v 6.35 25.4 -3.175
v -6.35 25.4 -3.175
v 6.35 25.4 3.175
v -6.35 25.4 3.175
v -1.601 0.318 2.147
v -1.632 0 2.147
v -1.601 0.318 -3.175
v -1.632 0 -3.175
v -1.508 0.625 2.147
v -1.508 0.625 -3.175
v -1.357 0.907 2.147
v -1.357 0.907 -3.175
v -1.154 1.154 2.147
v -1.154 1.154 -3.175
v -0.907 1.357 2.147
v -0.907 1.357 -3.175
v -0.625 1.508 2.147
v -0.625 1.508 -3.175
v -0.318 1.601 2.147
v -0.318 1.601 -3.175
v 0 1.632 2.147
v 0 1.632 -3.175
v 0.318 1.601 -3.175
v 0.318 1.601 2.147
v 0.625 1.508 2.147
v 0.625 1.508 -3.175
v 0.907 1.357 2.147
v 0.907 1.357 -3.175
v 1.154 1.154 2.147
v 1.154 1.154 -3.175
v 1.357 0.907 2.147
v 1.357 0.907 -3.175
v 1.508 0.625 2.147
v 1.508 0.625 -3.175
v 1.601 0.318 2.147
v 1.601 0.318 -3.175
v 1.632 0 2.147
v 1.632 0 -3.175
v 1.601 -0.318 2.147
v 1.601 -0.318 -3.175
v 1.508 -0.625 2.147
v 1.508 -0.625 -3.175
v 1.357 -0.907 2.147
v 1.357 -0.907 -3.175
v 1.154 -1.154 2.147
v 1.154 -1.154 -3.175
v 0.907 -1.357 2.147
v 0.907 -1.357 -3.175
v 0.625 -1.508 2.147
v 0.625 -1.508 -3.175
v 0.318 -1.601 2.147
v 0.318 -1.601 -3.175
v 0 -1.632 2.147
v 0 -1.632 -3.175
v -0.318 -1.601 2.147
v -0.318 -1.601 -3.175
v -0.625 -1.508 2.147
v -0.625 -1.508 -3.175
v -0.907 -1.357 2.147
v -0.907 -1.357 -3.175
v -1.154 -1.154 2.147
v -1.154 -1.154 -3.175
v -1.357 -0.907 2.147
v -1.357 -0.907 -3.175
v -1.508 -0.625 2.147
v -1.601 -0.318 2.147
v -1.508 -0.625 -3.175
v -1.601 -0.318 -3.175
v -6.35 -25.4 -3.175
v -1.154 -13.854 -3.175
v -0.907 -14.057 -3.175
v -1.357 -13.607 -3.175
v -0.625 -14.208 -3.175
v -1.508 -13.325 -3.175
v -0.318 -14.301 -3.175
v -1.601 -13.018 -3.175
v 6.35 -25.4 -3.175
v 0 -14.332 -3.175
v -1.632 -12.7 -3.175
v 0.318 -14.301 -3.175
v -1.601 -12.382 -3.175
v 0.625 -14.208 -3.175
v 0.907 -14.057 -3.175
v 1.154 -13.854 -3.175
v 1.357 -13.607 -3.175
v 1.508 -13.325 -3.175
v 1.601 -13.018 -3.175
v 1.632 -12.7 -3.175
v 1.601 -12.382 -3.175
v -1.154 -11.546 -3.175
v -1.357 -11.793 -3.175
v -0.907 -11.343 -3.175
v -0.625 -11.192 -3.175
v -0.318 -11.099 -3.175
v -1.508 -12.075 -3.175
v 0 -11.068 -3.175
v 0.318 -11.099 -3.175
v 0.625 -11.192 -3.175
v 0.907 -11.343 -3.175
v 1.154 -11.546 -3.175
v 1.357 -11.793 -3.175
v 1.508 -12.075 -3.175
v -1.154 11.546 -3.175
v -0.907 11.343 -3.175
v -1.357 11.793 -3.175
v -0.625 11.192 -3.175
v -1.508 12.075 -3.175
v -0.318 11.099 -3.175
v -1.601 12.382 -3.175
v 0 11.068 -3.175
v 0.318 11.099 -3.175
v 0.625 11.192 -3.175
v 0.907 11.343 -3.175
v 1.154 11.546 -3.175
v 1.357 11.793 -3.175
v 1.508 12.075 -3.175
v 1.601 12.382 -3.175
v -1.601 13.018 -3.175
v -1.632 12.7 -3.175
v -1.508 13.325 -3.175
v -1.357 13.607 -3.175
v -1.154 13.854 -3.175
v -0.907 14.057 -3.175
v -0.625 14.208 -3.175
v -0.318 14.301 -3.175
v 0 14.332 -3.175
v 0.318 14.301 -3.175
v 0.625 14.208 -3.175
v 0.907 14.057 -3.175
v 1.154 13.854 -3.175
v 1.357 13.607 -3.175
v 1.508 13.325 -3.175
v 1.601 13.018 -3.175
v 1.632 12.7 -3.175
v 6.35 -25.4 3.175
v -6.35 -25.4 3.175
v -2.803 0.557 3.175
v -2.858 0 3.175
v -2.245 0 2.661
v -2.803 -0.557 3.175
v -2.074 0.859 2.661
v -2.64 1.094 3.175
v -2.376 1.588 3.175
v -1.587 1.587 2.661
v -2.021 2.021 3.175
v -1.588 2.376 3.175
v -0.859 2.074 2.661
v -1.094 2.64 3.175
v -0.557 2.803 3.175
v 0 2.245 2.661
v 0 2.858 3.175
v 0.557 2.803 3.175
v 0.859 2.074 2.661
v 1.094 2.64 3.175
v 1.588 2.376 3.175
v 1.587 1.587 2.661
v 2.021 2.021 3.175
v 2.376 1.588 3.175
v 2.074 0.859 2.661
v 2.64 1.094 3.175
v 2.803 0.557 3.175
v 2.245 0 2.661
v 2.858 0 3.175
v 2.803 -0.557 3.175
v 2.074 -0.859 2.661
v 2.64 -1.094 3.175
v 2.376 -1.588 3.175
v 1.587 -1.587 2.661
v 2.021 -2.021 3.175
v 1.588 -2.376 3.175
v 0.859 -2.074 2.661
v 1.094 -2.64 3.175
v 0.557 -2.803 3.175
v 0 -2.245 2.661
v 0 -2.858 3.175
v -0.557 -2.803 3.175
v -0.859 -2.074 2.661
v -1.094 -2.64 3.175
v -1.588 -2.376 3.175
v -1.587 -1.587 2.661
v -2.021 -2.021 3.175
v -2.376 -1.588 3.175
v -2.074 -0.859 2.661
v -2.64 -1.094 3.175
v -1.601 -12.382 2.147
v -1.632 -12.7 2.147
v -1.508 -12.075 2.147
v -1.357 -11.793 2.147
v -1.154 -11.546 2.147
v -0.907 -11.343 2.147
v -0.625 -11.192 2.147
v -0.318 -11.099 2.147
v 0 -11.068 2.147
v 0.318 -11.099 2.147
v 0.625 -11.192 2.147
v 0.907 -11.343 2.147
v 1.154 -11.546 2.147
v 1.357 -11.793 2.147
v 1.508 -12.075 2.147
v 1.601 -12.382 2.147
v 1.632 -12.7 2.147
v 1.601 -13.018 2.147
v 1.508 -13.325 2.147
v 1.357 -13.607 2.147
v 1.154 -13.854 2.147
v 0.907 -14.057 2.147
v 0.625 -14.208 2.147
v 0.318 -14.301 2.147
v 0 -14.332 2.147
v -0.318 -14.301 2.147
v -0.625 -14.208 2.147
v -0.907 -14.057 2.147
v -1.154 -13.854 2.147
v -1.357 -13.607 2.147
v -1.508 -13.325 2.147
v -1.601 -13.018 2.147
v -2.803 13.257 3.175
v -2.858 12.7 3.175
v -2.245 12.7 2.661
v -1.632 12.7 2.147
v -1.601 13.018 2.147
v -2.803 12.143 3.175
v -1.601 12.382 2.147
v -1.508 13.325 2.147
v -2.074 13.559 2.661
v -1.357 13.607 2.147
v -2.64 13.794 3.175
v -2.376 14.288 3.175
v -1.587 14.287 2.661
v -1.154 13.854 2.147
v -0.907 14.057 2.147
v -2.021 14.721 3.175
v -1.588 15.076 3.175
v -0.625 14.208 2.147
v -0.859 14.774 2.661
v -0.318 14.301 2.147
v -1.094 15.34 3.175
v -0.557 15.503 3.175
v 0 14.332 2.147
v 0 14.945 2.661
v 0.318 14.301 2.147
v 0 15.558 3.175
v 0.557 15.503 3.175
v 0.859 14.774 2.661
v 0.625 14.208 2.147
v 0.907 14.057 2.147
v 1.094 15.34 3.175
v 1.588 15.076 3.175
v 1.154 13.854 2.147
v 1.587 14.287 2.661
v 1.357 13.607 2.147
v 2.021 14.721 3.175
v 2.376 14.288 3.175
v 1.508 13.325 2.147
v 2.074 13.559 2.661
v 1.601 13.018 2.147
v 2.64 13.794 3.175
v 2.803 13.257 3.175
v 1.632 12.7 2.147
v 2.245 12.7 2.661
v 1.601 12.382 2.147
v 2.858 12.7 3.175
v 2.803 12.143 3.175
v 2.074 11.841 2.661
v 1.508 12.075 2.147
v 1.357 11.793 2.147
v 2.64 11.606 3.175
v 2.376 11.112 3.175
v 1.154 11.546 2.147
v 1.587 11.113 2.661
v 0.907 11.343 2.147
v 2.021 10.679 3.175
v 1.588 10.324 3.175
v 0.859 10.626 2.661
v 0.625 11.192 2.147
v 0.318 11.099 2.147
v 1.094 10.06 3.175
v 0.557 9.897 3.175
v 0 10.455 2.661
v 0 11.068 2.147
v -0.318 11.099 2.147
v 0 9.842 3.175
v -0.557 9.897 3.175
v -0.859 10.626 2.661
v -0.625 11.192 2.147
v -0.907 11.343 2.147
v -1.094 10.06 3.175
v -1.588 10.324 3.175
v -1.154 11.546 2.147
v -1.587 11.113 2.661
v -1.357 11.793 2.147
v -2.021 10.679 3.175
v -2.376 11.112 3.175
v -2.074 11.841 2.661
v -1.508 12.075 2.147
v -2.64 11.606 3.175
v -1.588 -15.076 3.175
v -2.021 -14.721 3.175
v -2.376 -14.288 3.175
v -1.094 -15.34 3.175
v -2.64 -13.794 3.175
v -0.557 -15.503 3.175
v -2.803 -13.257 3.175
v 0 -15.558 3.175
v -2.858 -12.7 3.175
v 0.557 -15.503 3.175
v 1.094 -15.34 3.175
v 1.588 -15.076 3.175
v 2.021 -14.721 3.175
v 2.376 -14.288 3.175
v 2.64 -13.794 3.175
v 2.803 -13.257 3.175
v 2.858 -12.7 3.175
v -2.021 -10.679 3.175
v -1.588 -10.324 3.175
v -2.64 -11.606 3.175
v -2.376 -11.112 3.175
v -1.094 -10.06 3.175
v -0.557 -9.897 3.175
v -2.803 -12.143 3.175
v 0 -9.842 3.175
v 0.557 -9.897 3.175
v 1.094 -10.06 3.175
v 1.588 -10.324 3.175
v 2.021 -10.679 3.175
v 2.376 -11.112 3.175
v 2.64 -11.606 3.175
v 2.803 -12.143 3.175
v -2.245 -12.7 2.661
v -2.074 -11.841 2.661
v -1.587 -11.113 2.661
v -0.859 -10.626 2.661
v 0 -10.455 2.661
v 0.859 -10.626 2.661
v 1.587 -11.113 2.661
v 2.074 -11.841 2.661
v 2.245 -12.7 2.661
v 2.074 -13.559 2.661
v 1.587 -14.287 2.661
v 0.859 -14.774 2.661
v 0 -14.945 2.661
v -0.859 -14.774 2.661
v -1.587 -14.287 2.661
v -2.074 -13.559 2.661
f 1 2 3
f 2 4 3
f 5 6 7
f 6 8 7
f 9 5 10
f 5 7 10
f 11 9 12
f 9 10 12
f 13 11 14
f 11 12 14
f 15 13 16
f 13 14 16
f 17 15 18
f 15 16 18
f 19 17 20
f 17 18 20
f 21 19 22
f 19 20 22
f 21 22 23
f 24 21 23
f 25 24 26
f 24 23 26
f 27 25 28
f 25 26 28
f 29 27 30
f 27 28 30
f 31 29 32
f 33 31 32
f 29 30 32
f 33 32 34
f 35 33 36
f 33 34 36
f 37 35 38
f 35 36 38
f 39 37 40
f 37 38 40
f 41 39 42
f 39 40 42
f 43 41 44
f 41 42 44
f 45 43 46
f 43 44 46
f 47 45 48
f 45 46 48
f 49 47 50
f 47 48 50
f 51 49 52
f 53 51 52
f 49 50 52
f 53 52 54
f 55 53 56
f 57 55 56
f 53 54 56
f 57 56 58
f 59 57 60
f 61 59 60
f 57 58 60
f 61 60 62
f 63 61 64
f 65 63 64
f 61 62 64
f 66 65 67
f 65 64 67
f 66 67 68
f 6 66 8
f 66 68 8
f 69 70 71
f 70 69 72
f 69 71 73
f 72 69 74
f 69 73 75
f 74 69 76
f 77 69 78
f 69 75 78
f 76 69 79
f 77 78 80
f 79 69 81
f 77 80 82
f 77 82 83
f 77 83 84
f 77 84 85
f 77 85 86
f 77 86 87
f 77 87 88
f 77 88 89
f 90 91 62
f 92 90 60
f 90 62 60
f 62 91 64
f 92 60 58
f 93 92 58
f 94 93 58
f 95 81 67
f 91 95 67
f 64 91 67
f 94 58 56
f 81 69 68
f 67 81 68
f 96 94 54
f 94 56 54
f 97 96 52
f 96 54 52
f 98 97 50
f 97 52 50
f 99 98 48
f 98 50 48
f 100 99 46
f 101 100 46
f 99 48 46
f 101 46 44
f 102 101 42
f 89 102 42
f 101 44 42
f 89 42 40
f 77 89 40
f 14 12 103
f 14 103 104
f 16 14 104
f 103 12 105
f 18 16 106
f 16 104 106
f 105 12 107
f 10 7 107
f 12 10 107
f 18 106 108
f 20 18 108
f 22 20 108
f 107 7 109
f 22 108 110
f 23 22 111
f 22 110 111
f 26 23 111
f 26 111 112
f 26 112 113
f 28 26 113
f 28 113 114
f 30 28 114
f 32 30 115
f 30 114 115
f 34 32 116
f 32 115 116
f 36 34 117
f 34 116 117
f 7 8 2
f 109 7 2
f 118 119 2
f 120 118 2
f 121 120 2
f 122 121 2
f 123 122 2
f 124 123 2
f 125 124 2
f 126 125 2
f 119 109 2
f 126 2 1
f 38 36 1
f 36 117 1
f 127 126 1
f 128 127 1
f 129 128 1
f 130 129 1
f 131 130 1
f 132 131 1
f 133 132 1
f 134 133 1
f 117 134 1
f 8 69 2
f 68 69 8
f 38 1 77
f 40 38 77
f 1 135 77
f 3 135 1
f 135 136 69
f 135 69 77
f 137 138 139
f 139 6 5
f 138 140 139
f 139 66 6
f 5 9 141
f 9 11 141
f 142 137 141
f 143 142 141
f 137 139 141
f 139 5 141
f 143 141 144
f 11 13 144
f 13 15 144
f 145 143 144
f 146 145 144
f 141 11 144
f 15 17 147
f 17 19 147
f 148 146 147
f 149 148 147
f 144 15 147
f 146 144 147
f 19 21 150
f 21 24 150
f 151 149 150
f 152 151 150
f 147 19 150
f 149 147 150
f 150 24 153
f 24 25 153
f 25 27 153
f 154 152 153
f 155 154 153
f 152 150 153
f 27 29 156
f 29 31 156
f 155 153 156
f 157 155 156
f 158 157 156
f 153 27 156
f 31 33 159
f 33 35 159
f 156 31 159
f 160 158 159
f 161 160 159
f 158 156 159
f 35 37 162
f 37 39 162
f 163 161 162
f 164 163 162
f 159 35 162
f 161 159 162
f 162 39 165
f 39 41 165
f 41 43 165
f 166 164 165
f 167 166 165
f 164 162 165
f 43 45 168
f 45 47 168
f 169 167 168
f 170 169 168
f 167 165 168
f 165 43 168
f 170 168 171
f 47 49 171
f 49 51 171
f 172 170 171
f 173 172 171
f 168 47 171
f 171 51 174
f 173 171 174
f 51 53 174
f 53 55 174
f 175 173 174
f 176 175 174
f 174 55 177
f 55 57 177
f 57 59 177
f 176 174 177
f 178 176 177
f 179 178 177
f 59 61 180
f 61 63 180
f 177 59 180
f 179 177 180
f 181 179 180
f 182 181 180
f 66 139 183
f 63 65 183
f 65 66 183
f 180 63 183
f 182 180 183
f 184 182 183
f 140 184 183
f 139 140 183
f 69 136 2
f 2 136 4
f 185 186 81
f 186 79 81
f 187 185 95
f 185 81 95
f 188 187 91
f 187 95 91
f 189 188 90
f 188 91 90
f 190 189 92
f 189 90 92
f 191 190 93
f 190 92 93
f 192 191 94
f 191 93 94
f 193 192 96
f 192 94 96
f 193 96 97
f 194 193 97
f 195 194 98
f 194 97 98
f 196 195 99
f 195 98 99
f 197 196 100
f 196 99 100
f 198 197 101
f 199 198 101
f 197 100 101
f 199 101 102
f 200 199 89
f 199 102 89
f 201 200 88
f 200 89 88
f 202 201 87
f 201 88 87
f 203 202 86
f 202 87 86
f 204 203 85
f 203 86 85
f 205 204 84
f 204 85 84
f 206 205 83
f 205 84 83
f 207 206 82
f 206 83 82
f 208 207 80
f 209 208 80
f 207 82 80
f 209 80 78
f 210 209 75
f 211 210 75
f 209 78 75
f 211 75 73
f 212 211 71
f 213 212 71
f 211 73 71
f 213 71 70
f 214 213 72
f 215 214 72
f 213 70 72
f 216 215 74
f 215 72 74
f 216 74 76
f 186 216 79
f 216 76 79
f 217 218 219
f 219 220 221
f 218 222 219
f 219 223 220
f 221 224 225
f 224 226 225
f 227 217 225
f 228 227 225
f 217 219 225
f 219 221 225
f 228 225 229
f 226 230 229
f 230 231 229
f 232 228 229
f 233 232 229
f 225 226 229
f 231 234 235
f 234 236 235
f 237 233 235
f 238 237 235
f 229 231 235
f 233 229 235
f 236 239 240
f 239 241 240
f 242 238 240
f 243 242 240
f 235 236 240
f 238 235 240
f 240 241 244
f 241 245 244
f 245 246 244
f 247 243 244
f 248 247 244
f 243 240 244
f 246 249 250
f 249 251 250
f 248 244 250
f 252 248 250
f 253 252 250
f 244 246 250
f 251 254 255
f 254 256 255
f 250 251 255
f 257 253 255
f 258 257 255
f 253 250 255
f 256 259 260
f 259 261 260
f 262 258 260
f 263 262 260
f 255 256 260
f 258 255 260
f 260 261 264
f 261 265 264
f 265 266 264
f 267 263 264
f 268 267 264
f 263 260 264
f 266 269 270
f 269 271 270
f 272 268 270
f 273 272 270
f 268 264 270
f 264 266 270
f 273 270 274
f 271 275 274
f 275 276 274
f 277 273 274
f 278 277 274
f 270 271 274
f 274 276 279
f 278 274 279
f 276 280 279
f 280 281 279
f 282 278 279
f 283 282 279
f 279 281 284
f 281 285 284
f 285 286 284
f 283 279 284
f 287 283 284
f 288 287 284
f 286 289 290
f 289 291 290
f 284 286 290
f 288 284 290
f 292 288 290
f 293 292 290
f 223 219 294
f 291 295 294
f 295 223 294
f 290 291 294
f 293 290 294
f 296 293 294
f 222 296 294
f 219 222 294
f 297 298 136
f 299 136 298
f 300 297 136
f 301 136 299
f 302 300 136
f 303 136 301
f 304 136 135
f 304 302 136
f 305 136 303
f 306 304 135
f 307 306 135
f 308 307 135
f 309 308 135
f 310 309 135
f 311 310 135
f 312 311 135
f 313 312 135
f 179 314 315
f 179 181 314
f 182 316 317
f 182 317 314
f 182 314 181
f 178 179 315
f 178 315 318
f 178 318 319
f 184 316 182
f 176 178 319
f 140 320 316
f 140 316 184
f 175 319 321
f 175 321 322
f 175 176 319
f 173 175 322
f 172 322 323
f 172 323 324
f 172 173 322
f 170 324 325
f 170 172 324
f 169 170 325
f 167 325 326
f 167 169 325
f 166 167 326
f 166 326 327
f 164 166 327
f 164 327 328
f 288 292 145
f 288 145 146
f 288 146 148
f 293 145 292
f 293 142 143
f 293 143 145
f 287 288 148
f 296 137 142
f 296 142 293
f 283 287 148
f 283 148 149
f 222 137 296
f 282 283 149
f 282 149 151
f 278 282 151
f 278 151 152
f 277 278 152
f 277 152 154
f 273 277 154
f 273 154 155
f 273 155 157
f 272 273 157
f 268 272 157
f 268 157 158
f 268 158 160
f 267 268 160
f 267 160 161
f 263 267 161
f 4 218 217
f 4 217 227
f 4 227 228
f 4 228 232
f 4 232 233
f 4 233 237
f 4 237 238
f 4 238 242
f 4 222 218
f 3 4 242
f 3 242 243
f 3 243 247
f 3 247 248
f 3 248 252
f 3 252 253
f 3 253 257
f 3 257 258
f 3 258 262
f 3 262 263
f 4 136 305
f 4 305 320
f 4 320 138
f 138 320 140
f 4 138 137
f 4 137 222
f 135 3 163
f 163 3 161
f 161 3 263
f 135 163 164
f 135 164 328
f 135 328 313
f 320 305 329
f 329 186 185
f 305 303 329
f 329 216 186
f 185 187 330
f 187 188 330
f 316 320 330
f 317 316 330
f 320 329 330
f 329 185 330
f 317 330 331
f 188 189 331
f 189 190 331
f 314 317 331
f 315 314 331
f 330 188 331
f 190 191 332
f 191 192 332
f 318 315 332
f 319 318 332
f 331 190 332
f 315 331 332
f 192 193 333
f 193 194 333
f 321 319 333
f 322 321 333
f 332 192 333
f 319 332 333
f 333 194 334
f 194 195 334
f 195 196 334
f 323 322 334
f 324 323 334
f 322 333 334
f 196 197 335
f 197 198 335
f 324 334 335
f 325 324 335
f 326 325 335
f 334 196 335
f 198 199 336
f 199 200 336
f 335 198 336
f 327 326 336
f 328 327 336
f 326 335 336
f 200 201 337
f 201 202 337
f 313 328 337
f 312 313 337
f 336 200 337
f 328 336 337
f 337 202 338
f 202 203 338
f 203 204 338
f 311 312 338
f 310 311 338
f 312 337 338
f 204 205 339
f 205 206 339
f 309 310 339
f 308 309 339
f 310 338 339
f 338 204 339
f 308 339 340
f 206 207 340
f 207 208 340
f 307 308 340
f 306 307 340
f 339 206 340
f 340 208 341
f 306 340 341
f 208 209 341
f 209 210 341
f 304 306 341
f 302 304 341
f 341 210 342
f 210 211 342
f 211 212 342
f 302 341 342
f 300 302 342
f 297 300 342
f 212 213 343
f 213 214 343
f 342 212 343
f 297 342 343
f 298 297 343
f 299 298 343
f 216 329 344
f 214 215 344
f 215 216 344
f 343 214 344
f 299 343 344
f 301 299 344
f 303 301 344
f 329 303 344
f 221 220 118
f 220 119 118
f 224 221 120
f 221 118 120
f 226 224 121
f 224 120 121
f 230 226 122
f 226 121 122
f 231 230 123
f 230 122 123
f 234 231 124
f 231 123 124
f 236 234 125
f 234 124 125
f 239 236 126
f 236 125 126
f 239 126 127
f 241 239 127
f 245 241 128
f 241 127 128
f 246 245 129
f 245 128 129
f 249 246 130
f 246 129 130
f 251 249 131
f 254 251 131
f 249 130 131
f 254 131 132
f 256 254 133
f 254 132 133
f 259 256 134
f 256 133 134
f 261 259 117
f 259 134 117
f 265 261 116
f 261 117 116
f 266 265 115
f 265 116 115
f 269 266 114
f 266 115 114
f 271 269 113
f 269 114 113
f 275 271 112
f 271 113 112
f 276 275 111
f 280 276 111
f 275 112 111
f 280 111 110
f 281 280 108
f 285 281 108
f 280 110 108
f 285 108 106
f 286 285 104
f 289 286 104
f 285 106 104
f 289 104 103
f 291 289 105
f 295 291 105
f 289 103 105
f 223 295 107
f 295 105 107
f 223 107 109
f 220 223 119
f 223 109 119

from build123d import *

# Parameters (mm, degrees)
SKETCH1_W                                         = 12.7
SKETCH1_H                                         = 50.8
BOSS_EXTRUDE1_DEPTH                               = 3.175
CSK_FOR_4_FLAT_HEAD_MACHINE_SCREW_100_D           = 3.2639
CSK_FOR_4_FLAT_HEAD_MACHINE_SCREW_100_CSINK_D     = 5.715
CSK_FOR_4_FLAT_HEAD_MACHINE_SCREW_100_CSINK_ANGLE = 100


with BuildPart() as part:
    # Sketch1 → Boss-Extrude1 (new, symmetric)
    with BuildSketch(Plane.XY):
        Rectangle(SKETCH1_W, SKETCH1_H)
    extrude(amount=BOSS_EXTRUDE1_DEPTH, both=True)

    # CSK for #4 Flat Head Machine Screw (100)1 (through all)
    with Locations(Plane.XY.offset(3.175)):
        with Locations((0, 12.7), (0, 0), (0, -12.7)):
            CounterSinkHole(CSK_FOR_4_FLAT_HEAD_MACHINE_SCREW_100_D / 2, CSK_FOR_4_FLAT_HEAD_MACHINE_SCREW_100_CSINK_D / 2, counter_sink_angle=CSK_FOR_4_FLAT_HEAD_MACHINE_SCREW_100_CSINK_ANGLE)


solid = part.part
